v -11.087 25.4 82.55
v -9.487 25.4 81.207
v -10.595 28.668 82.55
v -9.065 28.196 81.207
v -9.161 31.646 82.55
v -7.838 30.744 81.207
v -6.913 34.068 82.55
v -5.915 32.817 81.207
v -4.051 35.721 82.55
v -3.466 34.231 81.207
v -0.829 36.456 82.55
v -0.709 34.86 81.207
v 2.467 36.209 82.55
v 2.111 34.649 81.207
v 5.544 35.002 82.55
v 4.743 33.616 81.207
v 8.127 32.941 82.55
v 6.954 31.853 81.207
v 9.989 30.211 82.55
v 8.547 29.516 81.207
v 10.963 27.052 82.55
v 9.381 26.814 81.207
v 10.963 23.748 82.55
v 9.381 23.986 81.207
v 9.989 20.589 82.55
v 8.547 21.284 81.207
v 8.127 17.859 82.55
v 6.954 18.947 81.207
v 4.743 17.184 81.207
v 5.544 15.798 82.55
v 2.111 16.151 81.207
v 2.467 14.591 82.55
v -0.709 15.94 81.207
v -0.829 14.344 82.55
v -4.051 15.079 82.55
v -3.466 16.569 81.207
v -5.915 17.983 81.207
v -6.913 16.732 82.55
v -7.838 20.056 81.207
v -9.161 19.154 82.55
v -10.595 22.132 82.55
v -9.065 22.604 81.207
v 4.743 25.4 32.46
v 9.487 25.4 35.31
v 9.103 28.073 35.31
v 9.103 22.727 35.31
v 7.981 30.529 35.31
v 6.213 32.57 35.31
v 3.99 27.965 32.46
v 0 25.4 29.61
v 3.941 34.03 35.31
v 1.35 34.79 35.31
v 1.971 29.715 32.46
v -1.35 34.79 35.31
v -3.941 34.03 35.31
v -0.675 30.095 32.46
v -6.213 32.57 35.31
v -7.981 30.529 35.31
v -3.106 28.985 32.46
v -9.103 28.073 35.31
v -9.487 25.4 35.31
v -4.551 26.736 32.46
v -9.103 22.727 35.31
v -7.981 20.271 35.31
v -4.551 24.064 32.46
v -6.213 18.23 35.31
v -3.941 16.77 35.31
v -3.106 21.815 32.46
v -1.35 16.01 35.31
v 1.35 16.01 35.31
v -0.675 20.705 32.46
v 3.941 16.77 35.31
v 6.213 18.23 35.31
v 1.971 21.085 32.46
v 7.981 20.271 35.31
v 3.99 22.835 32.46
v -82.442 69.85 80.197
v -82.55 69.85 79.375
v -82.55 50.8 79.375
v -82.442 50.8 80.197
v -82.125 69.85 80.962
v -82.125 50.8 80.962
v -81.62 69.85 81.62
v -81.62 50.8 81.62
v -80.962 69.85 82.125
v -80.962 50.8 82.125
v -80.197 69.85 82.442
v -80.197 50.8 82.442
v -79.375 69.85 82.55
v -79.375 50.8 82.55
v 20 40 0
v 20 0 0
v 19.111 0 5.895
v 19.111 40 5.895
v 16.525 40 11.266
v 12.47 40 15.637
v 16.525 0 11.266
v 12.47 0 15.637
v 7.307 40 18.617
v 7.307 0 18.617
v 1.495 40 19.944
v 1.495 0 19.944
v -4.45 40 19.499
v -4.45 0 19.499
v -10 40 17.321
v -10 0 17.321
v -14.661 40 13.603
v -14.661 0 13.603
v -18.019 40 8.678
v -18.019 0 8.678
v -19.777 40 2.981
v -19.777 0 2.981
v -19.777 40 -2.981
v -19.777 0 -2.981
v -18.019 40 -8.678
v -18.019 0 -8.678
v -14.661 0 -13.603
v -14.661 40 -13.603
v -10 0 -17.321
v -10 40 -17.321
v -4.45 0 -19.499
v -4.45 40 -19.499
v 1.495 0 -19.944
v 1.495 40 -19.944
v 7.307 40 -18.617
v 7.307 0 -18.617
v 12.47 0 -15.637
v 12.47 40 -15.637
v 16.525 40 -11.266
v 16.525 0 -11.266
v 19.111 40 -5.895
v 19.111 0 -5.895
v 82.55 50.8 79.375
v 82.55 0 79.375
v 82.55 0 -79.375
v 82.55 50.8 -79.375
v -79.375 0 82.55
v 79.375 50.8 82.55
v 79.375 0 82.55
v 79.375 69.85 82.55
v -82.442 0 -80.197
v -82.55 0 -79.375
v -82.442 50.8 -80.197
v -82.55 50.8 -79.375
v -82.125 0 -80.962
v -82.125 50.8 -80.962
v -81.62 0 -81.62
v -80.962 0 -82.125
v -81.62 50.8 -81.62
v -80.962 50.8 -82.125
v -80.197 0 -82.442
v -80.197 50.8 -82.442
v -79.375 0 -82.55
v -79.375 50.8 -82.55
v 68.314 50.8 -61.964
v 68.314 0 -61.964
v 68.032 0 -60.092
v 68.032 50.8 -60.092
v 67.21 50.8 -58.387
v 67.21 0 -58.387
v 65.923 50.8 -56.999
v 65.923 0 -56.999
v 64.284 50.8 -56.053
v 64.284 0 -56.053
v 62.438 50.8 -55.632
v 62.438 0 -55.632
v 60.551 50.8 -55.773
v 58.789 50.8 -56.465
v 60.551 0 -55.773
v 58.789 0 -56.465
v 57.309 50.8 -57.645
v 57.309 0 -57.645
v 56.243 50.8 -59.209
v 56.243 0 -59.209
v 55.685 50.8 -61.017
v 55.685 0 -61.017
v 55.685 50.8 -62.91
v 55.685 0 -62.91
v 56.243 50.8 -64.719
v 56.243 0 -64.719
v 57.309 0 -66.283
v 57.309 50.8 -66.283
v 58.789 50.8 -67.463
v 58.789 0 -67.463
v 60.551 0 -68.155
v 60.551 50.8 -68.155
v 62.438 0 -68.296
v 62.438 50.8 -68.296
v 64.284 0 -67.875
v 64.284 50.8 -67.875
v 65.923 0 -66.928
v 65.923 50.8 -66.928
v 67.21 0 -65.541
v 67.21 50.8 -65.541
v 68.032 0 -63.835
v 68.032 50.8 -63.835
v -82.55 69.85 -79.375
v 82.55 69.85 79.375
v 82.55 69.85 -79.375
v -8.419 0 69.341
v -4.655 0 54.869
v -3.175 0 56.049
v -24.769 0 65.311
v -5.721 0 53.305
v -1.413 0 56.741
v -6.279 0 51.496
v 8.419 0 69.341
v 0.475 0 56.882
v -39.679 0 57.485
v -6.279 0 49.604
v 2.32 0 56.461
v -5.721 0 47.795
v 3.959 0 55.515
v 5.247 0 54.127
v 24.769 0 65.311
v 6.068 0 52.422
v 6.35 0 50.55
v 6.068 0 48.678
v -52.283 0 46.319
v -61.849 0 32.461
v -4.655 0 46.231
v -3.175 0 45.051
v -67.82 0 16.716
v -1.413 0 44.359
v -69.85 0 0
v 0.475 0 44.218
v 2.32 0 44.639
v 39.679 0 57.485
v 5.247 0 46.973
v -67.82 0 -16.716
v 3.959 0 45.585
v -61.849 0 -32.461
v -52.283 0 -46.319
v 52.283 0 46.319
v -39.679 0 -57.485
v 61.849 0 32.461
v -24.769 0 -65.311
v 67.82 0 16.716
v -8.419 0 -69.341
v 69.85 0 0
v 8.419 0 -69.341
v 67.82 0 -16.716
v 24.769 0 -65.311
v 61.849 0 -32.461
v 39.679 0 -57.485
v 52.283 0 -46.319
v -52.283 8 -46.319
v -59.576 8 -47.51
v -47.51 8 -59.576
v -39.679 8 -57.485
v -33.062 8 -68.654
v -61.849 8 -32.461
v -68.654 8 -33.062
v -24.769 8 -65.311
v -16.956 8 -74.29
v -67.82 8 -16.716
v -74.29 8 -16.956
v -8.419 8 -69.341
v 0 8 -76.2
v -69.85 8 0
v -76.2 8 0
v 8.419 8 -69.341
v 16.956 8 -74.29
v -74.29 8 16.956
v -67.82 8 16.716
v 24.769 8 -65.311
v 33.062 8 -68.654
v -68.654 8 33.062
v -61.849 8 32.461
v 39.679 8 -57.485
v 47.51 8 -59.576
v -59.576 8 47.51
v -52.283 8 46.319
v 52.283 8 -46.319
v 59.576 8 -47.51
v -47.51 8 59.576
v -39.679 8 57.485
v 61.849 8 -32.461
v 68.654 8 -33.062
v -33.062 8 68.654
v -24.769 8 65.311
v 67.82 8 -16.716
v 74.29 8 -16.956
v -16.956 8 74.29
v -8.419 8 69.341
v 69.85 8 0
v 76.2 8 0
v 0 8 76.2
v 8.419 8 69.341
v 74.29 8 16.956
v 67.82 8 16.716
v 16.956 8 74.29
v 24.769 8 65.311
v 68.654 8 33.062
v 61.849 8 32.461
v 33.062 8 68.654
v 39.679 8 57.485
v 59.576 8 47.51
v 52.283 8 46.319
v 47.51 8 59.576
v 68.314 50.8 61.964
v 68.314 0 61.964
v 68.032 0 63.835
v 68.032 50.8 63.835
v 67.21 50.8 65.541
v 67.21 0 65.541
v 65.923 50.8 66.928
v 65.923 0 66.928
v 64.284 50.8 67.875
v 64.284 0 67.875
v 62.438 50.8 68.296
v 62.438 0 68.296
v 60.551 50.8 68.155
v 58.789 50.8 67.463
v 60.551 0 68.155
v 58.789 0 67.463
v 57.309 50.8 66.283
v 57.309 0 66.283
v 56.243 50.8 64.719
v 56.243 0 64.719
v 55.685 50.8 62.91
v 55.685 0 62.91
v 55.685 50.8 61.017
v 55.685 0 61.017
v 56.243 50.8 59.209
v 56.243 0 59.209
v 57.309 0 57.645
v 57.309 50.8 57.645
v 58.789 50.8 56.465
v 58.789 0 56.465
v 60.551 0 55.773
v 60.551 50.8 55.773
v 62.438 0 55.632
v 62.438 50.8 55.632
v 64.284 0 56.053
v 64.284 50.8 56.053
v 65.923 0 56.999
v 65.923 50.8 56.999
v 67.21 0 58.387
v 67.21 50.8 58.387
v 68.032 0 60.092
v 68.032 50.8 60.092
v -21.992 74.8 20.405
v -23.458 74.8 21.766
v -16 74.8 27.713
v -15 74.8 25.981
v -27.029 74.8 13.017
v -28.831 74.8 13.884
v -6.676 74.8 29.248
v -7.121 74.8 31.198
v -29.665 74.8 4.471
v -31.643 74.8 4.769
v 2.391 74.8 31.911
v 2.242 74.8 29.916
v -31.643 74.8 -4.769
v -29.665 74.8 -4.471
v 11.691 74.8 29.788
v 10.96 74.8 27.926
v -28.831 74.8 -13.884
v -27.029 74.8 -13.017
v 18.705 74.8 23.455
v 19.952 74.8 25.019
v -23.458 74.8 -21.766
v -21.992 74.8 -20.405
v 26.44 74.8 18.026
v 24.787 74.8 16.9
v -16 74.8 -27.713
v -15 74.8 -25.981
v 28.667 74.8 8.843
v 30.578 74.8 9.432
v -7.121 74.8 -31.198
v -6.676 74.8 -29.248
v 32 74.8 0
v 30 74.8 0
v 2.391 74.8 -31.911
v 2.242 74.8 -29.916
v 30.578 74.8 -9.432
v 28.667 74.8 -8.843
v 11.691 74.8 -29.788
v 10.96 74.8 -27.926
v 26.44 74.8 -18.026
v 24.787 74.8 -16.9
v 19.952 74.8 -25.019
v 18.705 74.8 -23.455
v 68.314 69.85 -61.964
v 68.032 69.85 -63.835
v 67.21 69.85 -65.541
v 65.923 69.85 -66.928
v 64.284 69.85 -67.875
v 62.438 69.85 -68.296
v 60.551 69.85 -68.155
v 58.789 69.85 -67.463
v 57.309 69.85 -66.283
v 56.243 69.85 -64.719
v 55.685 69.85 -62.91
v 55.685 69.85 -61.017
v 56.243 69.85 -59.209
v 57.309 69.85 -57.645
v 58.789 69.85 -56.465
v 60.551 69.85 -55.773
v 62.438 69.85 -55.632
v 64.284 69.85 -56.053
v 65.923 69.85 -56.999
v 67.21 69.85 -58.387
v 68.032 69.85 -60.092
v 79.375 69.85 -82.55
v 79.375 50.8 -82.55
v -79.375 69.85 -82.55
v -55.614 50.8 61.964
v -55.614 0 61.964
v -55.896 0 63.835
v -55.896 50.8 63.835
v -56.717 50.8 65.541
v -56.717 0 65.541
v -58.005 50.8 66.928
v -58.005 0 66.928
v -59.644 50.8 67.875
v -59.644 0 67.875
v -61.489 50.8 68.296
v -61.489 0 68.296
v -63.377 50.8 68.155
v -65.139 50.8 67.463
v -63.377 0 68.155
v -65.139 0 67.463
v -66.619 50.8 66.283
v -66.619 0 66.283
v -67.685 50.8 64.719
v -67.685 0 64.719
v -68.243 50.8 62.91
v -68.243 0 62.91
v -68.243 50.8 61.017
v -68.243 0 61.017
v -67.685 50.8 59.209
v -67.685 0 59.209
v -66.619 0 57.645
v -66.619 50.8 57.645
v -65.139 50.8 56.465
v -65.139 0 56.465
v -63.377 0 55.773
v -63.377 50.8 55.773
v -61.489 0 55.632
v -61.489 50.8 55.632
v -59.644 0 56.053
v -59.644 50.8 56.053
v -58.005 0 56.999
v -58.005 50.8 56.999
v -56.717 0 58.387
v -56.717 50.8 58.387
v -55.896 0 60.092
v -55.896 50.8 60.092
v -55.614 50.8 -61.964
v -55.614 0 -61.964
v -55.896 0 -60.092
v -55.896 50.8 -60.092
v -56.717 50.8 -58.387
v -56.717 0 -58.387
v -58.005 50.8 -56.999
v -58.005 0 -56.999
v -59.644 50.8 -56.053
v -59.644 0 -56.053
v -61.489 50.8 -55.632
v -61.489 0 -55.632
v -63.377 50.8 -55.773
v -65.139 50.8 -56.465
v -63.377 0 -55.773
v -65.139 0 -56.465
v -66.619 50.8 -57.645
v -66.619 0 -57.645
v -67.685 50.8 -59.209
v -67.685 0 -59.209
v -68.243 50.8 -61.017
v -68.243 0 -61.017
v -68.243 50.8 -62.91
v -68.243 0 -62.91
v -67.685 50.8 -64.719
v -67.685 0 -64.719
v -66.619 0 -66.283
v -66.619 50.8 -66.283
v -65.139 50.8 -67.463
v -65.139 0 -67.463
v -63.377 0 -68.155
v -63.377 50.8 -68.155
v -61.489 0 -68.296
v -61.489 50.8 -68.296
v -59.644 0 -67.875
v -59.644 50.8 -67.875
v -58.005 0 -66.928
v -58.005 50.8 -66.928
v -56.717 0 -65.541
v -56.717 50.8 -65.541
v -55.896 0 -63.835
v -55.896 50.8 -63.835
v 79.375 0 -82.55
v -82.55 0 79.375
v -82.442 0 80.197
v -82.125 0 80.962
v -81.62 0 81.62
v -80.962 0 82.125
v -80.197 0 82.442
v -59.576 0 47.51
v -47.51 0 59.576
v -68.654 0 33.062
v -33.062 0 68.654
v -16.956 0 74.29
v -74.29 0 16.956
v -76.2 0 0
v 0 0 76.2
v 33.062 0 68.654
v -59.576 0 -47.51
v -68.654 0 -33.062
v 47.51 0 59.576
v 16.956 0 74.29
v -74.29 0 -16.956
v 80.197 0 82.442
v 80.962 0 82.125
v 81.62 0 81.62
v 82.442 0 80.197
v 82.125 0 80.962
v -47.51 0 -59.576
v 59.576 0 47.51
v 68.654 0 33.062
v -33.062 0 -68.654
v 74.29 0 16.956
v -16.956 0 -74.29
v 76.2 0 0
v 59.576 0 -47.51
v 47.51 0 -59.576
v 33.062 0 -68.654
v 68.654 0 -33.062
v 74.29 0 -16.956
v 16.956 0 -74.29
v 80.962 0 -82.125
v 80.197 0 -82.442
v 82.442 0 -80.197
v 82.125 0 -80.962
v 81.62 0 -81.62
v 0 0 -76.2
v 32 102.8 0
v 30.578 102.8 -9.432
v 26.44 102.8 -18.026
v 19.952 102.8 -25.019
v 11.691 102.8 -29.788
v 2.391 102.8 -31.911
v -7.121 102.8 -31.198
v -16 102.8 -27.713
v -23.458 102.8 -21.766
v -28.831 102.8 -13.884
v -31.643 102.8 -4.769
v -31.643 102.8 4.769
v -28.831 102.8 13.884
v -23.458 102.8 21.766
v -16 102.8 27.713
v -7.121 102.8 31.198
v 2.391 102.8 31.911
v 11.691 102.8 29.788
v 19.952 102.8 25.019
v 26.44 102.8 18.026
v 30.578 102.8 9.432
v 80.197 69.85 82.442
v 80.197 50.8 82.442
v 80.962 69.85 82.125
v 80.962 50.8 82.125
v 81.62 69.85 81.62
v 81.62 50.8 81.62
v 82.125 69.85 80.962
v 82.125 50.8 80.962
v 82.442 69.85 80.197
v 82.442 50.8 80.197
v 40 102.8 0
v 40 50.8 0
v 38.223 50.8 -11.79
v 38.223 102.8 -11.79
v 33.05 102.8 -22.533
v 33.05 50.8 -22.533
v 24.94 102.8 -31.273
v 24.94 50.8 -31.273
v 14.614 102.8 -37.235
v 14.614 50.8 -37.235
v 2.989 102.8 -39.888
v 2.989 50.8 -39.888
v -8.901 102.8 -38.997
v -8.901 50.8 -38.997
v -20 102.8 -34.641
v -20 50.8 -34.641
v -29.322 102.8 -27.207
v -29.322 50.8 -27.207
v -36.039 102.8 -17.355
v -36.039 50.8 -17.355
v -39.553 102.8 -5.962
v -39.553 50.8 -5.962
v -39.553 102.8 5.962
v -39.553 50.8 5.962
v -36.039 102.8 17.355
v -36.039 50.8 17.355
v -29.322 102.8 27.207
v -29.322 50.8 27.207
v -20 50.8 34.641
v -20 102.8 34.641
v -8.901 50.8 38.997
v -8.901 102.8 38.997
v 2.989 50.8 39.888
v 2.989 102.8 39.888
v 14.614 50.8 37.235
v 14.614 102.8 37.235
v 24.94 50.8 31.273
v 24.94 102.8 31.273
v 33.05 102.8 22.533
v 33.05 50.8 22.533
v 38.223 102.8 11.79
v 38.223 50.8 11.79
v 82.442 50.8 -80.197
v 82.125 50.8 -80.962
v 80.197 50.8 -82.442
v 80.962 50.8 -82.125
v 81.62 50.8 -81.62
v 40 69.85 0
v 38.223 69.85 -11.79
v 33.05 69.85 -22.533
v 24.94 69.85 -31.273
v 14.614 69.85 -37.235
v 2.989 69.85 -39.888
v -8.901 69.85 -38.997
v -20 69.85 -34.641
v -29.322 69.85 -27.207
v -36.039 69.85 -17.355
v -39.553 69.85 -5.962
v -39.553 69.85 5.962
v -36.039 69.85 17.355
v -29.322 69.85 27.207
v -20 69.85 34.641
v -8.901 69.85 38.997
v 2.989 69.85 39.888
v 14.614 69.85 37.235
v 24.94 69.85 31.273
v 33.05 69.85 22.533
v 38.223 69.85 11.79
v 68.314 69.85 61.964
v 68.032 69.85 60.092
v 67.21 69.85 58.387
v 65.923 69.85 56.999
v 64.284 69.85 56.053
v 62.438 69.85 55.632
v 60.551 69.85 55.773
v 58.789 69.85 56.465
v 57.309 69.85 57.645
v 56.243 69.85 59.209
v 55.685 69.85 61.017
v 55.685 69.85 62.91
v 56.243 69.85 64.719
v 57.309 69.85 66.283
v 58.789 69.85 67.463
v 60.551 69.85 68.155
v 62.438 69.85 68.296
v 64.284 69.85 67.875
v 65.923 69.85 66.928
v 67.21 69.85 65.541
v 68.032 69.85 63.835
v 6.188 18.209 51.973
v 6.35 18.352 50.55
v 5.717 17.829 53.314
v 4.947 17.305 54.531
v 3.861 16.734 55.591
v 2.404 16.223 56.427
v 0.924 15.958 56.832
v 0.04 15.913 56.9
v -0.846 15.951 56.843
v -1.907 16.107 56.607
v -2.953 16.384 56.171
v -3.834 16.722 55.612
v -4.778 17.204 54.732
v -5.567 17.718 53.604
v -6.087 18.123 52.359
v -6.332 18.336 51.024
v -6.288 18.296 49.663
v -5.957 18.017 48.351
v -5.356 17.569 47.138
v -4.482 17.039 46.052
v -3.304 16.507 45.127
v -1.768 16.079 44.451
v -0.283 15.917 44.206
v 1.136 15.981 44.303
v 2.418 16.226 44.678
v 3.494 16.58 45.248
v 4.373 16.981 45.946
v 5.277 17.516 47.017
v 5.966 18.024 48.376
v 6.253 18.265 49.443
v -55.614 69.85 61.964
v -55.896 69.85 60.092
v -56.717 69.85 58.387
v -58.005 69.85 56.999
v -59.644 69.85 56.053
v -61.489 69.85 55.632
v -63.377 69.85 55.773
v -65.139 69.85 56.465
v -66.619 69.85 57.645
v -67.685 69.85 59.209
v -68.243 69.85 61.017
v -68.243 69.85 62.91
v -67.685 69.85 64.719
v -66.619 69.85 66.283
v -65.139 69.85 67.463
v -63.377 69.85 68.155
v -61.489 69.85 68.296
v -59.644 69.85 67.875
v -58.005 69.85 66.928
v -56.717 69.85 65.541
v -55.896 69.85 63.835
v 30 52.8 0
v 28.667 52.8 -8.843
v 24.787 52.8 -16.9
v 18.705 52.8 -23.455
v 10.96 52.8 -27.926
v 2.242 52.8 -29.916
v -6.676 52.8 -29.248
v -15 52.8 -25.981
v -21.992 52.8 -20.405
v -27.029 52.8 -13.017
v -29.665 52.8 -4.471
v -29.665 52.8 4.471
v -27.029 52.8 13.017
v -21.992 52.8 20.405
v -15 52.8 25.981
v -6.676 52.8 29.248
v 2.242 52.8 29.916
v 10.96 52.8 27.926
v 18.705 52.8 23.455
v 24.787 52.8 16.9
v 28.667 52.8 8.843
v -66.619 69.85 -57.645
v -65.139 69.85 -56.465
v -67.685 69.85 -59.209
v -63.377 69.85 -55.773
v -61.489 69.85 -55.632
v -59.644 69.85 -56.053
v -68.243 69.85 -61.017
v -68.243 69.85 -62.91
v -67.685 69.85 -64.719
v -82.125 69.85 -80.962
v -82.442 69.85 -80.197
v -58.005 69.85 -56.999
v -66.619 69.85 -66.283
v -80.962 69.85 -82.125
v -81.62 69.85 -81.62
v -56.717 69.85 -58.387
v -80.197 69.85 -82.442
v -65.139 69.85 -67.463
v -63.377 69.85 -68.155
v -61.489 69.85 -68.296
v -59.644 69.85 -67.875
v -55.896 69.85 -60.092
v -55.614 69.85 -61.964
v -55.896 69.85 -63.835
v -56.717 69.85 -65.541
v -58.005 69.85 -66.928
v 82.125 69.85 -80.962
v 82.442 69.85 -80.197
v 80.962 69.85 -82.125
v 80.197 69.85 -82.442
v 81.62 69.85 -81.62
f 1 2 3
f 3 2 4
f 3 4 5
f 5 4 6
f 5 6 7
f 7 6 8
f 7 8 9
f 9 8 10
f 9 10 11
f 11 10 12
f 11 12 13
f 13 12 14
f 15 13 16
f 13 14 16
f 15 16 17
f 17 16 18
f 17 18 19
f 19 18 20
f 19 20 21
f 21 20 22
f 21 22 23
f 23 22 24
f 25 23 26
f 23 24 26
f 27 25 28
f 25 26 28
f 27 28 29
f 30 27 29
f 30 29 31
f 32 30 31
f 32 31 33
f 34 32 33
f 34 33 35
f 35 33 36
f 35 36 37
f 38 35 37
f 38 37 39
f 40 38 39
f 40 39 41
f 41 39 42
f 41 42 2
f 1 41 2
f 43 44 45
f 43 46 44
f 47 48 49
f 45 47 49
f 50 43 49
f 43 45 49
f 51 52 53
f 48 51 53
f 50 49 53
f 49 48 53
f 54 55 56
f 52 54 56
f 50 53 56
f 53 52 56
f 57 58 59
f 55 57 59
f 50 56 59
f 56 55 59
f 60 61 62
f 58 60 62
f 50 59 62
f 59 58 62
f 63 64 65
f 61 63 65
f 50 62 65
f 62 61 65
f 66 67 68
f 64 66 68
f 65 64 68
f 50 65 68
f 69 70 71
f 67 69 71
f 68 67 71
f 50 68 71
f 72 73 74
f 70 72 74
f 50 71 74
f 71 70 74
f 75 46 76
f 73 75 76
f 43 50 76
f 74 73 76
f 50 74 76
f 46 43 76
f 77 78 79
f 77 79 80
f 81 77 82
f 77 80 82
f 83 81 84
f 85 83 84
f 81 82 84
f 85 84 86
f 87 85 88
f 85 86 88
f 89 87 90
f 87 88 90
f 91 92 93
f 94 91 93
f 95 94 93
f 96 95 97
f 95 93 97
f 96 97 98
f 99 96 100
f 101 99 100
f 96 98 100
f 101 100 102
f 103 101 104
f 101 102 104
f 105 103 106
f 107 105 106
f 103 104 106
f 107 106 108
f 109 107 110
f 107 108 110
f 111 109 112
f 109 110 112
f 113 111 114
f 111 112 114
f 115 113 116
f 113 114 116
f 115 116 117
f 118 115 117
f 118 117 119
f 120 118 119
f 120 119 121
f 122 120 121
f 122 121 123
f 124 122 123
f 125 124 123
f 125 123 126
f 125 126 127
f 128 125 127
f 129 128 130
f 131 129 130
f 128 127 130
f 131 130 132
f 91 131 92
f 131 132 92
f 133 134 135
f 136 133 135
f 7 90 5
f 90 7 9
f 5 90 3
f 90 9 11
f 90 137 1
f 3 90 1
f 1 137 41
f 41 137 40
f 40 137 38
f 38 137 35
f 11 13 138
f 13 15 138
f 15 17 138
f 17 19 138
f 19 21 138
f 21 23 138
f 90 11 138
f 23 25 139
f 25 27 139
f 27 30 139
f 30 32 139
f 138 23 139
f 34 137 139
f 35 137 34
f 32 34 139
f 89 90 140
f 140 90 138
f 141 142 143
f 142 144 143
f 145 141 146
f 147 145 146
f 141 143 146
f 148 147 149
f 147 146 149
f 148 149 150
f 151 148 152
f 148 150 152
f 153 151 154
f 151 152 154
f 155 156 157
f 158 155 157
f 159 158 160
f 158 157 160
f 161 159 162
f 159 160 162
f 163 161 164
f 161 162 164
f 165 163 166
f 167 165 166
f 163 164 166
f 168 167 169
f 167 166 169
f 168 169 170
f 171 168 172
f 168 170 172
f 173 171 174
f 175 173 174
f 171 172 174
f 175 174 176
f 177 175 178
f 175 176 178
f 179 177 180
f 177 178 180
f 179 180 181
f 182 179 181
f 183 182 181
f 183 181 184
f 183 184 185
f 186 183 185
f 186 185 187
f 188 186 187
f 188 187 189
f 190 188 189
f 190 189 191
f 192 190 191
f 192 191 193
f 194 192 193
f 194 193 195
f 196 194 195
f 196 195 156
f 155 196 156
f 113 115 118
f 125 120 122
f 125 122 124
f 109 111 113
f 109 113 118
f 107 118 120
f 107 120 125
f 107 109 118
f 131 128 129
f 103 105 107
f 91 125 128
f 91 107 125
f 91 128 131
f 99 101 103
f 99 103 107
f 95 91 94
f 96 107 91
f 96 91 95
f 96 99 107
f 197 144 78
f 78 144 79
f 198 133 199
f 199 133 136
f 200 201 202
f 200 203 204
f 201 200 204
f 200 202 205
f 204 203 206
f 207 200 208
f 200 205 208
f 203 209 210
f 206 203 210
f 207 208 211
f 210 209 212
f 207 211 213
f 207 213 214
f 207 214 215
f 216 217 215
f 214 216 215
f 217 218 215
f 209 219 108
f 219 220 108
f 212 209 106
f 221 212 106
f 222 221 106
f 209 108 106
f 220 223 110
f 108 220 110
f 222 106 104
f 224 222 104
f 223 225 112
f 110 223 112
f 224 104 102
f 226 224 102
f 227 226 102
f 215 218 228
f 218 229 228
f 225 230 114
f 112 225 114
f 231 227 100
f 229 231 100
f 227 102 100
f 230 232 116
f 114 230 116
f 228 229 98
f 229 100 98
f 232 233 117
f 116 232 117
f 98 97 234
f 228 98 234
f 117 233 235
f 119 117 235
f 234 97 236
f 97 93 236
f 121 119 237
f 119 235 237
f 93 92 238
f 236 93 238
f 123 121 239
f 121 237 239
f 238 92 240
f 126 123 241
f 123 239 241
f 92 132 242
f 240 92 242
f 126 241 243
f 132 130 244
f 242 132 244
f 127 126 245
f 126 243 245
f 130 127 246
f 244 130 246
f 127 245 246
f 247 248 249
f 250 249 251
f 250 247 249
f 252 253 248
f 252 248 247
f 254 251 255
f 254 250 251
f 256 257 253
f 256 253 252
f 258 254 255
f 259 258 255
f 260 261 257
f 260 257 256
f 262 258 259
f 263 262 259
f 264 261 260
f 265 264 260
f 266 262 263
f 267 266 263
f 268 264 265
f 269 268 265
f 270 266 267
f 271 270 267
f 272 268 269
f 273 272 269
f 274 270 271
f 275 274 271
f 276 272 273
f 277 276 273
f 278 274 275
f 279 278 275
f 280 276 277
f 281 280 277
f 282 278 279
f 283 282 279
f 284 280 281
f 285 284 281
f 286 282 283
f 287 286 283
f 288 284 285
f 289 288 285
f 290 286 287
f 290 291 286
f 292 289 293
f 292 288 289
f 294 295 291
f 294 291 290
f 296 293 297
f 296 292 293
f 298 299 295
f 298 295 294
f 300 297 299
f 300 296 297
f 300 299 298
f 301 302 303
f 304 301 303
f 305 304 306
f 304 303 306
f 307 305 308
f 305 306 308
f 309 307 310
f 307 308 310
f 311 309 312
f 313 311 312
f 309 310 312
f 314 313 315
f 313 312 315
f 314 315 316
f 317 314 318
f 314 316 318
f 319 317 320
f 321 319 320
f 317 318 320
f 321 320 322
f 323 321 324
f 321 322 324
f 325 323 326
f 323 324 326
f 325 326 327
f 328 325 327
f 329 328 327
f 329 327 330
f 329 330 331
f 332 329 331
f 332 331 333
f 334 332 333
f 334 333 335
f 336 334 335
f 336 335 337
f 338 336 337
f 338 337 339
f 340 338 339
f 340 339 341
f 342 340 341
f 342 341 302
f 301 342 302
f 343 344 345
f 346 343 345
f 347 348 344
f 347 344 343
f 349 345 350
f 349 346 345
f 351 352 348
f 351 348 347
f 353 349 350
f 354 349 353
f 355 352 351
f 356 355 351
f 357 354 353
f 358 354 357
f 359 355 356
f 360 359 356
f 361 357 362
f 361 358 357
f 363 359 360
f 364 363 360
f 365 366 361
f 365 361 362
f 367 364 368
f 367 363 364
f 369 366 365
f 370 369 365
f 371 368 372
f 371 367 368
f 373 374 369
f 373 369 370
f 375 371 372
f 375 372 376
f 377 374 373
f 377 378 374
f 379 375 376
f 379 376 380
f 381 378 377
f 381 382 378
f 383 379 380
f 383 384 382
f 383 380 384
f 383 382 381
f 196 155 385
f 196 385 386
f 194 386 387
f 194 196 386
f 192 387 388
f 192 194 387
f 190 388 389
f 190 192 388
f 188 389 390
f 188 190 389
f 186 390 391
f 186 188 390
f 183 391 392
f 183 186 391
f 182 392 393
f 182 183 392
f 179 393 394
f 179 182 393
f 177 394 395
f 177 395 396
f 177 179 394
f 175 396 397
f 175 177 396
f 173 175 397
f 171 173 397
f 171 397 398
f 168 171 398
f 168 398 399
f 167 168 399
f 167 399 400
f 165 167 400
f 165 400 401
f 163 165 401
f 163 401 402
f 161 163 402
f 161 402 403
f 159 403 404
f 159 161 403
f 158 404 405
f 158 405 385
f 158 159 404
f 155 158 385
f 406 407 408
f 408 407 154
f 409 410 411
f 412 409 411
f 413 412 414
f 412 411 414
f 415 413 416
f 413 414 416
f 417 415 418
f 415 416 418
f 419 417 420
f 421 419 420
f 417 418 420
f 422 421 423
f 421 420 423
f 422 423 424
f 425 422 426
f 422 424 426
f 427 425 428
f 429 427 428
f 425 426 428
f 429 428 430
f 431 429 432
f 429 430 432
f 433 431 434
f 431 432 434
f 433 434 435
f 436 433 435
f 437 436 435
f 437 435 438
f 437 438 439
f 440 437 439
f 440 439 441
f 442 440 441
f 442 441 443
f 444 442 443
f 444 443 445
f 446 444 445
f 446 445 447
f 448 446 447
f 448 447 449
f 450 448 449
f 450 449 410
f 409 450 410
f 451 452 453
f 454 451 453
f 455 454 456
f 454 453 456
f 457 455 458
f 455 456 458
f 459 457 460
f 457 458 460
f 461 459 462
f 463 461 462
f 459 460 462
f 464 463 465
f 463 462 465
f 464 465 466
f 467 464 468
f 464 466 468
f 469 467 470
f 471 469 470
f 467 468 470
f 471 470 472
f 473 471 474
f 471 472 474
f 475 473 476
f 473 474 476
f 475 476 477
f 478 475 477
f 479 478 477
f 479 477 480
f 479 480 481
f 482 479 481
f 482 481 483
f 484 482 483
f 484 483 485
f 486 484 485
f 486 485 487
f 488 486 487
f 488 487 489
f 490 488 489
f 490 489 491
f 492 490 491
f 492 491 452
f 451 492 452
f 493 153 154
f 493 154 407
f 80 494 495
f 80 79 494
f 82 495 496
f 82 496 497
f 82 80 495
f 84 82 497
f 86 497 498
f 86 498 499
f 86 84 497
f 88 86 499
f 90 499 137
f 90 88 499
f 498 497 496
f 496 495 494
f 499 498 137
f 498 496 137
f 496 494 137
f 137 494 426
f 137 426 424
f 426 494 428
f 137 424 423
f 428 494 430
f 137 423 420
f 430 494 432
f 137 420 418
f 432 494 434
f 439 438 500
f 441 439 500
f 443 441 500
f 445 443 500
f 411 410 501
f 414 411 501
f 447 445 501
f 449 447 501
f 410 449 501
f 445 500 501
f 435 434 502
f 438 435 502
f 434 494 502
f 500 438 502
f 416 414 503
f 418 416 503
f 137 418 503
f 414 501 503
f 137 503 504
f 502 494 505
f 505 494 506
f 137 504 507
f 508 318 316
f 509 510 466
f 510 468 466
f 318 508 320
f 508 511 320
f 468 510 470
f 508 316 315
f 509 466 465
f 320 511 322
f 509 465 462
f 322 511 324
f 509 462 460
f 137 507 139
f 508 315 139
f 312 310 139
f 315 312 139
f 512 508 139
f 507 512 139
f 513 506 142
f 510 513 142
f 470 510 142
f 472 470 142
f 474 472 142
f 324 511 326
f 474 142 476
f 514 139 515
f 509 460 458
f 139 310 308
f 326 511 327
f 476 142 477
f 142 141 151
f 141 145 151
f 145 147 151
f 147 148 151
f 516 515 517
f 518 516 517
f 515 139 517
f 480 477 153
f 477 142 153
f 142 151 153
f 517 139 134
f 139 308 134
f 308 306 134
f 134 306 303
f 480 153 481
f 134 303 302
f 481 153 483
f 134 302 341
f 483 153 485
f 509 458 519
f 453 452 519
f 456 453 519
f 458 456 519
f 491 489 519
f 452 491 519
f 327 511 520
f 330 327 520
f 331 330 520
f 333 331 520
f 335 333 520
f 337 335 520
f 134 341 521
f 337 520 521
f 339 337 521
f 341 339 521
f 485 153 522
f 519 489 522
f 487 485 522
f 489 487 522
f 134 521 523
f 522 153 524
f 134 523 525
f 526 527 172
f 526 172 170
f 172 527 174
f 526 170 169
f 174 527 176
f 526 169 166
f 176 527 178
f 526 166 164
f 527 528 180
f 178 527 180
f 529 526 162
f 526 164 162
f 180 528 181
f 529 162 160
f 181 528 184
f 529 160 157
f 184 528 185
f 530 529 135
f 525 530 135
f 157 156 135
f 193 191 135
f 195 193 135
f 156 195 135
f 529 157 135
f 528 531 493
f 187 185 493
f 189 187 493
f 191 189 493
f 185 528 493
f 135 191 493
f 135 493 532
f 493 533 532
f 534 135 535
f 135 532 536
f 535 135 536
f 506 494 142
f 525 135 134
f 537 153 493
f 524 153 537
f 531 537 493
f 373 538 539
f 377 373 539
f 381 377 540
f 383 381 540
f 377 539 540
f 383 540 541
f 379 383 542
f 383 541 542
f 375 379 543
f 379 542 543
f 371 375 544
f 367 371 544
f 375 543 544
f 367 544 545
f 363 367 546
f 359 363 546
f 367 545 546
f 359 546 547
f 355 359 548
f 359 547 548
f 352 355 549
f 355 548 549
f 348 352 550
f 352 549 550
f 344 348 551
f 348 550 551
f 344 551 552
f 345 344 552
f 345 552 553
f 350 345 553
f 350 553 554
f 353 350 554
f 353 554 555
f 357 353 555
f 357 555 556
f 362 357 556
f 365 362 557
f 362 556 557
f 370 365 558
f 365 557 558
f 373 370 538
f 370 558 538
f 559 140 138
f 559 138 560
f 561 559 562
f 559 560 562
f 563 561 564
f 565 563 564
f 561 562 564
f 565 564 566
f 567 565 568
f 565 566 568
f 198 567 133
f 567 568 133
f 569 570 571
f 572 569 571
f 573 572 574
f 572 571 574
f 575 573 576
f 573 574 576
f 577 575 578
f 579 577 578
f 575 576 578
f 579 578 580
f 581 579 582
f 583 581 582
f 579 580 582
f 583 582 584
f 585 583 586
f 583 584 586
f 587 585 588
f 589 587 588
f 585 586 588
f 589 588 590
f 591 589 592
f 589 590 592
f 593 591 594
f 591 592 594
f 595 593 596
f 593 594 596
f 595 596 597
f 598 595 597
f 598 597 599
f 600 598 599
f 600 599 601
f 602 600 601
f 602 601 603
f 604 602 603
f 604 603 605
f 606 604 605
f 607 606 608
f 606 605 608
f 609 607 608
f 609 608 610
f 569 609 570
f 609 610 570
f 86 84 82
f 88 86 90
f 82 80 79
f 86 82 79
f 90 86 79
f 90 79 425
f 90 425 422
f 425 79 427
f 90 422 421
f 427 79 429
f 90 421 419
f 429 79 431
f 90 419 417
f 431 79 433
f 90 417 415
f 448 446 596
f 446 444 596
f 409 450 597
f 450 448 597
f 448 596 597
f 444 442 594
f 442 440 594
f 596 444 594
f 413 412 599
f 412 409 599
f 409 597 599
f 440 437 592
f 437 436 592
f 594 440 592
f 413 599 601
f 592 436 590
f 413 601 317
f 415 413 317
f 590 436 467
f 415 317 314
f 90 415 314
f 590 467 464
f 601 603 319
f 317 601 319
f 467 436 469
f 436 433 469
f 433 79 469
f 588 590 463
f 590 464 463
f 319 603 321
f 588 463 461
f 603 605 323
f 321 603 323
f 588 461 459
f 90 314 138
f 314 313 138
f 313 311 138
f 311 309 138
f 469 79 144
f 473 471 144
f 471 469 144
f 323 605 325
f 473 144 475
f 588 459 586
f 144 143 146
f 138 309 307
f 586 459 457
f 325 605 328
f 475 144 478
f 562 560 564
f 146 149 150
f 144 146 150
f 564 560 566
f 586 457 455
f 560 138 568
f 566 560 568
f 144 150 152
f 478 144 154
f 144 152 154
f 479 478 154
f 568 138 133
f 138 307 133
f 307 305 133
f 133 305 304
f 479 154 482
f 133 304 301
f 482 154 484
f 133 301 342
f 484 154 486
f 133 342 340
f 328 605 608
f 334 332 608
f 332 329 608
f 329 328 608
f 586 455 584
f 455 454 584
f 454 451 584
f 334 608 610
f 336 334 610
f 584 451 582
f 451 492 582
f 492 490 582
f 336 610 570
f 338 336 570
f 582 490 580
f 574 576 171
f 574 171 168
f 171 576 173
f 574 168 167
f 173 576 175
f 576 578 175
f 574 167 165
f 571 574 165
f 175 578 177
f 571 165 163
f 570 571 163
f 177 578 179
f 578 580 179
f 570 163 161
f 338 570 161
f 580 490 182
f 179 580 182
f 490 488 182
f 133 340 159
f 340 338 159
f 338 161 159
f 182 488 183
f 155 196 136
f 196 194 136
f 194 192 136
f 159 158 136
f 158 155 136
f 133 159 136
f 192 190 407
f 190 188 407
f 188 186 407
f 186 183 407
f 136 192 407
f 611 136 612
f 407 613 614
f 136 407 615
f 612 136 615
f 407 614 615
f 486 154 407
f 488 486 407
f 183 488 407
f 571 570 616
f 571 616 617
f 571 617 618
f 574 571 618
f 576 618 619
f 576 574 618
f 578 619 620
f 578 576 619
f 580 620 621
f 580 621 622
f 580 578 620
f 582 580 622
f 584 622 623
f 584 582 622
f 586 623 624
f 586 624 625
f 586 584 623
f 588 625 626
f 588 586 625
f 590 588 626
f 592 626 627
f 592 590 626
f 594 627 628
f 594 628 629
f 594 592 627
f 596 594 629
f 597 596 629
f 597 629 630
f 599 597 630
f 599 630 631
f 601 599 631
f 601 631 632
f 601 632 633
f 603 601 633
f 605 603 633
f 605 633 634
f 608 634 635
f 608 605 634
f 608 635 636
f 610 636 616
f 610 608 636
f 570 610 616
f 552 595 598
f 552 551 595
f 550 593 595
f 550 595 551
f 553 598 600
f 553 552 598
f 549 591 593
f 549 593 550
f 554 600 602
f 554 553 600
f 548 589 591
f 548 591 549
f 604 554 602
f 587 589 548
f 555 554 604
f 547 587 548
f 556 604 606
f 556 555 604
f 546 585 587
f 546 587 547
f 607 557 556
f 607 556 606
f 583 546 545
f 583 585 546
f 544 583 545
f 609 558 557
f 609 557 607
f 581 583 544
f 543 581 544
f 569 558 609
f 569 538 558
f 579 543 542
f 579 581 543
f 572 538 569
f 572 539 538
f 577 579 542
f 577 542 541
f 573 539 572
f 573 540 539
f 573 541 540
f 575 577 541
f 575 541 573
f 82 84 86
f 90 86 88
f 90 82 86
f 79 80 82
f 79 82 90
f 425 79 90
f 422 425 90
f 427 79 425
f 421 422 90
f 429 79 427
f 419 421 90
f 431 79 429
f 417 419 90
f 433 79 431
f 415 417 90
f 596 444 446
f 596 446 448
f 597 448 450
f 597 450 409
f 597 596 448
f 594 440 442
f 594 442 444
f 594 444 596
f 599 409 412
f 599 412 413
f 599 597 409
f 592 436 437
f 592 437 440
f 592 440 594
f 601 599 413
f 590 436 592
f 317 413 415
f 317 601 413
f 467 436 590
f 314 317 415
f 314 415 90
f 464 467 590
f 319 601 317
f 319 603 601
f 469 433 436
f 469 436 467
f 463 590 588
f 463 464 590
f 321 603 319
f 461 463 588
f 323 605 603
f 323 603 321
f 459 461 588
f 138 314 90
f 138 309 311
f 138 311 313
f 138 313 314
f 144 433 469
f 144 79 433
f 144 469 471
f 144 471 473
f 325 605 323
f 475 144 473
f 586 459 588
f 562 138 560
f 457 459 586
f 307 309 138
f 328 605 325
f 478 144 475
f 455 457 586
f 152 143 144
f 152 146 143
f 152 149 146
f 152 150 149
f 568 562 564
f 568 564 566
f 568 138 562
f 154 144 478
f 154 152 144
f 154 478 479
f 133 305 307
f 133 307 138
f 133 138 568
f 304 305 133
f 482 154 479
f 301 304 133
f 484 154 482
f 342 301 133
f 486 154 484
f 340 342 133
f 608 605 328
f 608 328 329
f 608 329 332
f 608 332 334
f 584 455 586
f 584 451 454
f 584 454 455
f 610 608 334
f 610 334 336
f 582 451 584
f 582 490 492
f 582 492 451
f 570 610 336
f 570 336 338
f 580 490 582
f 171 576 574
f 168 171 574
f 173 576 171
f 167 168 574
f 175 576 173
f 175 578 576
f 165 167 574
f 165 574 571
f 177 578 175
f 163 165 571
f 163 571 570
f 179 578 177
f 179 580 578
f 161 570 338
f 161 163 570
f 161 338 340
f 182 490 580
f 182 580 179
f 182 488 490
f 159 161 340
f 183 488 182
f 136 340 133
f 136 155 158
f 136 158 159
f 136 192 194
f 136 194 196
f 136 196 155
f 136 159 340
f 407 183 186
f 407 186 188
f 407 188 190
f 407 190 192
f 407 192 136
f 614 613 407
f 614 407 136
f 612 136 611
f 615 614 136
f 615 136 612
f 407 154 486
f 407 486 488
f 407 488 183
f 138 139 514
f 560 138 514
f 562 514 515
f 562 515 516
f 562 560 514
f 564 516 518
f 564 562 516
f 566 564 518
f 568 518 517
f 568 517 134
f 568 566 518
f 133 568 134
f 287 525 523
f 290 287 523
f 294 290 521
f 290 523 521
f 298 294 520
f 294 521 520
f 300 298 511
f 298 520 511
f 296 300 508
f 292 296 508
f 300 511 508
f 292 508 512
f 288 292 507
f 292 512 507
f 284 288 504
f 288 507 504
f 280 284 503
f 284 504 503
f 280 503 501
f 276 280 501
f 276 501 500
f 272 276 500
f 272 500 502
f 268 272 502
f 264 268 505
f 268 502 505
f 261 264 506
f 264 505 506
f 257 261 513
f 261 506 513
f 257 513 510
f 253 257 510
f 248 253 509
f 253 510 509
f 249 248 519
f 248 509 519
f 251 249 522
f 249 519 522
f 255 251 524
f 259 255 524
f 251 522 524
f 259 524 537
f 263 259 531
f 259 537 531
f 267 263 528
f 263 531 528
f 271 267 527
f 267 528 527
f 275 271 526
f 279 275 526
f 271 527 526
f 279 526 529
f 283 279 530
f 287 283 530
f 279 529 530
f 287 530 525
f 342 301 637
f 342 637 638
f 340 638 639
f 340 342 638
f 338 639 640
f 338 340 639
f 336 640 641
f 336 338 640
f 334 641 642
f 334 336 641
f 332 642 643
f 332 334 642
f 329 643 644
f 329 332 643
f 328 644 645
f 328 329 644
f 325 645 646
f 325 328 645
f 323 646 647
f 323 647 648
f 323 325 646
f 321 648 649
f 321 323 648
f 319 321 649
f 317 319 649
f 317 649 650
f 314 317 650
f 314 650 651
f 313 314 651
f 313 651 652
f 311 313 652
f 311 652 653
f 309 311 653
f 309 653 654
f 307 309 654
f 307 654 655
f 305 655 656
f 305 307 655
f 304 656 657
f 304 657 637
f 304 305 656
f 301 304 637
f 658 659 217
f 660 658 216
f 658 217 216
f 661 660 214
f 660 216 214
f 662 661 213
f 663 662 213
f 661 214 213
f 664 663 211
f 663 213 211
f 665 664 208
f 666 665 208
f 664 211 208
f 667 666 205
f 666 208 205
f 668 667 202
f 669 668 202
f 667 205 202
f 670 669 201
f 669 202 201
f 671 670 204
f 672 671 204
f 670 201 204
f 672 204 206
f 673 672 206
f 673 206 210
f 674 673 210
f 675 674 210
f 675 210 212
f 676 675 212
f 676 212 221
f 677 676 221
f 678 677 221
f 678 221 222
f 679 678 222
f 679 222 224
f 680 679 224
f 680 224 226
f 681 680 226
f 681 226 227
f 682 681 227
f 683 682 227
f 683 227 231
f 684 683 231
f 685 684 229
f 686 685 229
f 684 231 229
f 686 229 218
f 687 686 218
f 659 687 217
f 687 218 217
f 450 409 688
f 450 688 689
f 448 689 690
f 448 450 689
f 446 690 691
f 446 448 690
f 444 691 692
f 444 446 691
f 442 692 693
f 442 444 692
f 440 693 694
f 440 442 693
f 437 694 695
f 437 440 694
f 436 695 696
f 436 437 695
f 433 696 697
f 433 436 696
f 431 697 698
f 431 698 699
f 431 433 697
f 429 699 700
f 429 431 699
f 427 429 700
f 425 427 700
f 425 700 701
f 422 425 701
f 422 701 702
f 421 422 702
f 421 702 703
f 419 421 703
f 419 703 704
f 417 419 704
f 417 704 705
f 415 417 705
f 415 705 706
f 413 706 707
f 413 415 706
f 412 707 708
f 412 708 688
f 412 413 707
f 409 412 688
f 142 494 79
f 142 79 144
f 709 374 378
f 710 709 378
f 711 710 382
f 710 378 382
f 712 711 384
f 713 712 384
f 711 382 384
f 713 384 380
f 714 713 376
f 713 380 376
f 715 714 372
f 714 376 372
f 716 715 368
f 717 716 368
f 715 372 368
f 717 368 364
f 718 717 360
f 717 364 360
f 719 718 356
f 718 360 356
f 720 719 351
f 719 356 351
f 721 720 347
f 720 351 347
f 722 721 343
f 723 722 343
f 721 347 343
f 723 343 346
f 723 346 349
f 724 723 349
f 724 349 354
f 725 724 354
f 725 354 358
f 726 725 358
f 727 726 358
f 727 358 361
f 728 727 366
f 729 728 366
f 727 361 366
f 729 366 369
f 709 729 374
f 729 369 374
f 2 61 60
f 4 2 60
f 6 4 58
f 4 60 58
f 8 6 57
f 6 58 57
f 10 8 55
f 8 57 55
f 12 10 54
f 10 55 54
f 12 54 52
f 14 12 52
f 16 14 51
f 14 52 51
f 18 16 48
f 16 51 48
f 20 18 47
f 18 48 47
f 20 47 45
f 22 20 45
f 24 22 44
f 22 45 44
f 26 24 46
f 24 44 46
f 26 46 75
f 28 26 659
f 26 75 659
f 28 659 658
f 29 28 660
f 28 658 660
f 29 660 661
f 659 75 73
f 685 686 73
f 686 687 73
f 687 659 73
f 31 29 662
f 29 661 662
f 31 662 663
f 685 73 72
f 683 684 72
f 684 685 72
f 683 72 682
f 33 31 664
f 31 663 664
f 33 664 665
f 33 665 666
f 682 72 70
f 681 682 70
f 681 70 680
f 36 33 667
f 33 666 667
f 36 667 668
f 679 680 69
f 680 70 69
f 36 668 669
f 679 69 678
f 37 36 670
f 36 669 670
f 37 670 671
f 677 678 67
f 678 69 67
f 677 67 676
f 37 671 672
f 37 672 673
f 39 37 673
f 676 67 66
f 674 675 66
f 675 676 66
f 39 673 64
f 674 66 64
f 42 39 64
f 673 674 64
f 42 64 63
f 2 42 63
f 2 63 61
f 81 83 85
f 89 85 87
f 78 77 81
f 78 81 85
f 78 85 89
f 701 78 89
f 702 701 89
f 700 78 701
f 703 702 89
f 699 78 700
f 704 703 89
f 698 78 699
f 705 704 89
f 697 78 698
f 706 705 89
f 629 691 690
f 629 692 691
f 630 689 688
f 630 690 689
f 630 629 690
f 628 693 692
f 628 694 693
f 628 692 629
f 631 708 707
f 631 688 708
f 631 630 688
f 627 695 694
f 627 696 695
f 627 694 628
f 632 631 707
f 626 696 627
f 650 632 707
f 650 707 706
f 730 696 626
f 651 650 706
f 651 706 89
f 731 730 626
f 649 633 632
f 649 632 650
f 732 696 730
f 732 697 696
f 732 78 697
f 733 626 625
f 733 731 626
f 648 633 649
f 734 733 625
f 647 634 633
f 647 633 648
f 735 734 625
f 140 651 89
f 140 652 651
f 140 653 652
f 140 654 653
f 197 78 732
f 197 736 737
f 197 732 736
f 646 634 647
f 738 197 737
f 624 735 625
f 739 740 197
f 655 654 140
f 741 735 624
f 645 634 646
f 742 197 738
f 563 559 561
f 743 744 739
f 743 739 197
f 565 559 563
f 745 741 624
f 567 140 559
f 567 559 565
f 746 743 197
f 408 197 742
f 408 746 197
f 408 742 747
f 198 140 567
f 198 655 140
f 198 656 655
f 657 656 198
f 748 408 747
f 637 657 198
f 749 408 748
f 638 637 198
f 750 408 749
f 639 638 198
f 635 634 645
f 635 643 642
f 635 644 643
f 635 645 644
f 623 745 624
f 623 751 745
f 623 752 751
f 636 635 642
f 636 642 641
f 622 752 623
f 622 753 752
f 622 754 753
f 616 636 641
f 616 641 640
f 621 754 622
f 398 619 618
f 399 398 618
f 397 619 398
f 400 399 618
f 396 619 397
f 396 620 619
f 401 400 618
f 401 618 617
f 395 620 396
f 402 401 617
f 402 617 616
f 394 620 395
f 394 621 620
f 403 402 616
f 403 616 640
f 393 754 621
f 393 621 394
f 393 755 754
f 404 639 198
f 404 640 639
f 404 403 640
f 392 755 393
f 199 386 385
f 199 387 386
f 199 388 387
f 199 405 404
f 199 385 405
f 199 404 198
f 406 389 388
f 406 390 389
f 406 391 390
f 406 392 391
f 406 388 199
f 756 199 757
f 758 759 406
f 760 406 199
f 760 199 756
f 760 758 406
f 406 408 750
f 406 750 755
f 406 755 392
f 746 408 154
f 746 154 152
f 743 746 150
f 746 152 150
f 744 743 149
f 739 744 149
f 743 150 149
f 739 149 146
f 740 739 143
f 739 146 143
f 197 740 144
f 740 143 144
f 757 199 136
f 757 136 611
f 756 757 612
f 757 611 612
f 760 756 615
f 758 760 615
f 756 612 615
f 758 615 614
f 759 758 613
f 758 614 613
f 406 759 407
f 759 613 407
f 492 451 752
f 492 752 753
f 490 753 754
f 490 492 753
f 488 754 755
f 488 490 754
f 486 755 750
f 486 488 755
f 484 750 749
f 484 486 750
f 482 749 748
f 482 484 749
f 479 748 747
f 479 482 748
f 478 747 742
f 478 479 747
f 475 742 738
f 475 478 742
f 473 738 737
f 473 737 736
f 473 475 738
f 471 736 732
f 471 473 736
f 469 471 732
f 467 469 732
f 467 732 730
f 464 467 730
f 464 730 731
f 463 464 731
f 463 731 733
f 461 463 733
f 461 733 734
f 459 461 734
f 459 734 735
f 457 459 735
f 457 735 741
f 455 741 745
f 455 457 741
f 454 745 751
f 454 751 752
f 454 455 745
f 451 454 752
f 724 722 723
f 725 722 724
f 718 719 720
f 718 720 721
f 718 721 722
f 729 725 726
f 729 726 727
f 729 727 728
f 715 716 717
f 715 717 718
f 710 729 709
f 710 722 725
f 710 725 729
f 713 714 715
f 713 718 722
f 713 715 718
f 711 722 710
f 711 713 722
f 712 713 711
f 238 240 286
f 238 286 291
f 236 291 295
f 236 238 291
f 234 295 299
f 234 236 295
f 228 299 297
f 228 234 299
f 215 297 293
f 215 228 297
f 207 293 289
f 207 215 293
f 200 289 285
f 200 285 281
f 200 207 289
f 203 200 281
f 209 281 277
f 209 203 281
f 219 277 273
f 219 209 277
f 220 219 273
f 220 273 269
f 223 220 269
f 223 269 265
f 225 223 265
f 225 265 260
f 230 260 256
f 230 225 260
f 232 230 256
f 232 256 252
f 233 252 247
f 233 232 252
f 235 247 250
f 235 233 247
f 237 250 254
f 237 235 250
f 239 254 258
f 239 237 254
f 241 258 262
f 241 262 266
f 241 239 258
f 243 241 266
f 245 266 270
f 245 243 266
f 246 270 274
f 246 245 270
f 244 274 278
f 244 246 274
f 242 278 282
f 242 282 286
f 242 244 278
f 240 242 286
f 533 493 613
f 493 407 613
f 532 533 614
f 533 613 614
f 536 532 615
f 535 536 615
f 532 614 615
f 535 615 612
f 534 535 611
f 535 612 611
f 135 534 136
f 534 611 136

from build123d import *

# Parameters (mm, degrees)
SKETCH1_W                              = 165.1
SKETCH1_H                              = 165.1
BOSS_EXTRUDE1_DEPTH                    = 50.8
SKETCH2_R                              = 40
BOSS_EXTRUDE2_DEPTH                    = 52
SKETCH3_R                              = 32
CUT_EXTRUDE1_DEPTH                     = 28
SKETCH4_R                              = 30
CUT_EXTRUDE2_DEPTH                     = 22
FILLET1_R                              = 3.175
SKETCH5_R                              = 20
CUT_EXTRUDE3_DEPTH                     = 40
SKETCH6_R                              = 76.2
SKETCH6_R_2                            = 69.85
CUT_EXTRUDE4_DEPTH                     = 8
F_1_2_14_NPSM_TAPPED_HOLE1_D           = 18.9738
F_1_2_14_NPSM_TAPPED_HOLE1_DEPTH       = 47.24
F_1_2_14_NPSM_TAPPED_HOLE1_CSINK_D     = 22.1742
F_1_2_14_NPSM_TAPPED_HOLE1_CSINK_ANGLE = 100
F_1_2_14_NPSM_TAPPED_HOLE1_TIP         = 5.700304607
SKETCH10_R                             = 6.35
CUT_EXTRUDE5_DEPTH                     = 25
SKETCH11_R                             = 6.35
CUT_EXTRUDE6_DEPTH                     = 103.8
SKETCH13_R                             = 6.35
SKETCH13_R_2                           = 40
BOSS_EXTRUDE3_DEPTH                    = 19.05


with BuildPart() as part:
    # Sketch1 → Boss-Extrude1 (new body)
    with BuildSketch(Plane(origin=(0, 0, 0), x_dir=(1, 0, 0), z_dir=(0, 1, 0))):
        Rectangle(SKETCH1_W, SKETCH1_H)
    extrude(amount=BOSS_EXTRUDE1_DEPTH)

    # Sketch2 → Boss-Extrude2 (add)
    with BuildSketch(Plane(origin=(0, 50.8, 0), x_dir=(1, 0, 0), z_dir=(0, 1, 0))):
        Circle(SKETCH2_R)
    extrude(amount=BOSS_EXTRUDE2_DEPTH)

    # Sketch3 → Cut-Extrude1 (cut)
    with BuildSketch(Plane(origin=(0, 102.8, 0), x_dir=(1, 0, 0), z_dir=(0, 1, 0))):
        Circle(SKETCH3_R)
    extrude(amount=-CUT_EXTRUDE1_DEPTH, mode=Mode.SUBTRACT)

    # Sketch4 → Cut-Extrude2 (cut)
    with BuildSketch(Plane(origin=(0, 74.8, 0), x_dir=(1, 0, 0), z_dir=(0, 1, 0))):
        Circle(SKETCH4_R)
    extrude(amount=-CUT_EXTRUDE2_DEPTH, mode=Mode.SUBTRACT)

    # Fillet1
    fillet1_edges = [part.edges().sort_by_distance(p)[0] for p in [
        (82.55, 25.4, 82.55),
        (-82.55, 25.4, 82.55),
        (-82.55, 25.4, -82.55),
        (82.55, 25.4, -82.55),
    ]]
    fillet(fillet1_edges, radius=FILLET1_R)

    # Sketch5 → Cut-Extrude3 (cut)
    with BuildSketch(Plane.XZ):
        Circle(SKETCH5_R)
    extrude(amount=-CUT_EXTRUDE3_DEPTH, mode=Mode.SUBTRACT)

    # Sketch6 → Cut-Extrude4 (cut)
    with BuildSketch(Plane.XZ):
        Circle(SKETCH6_R)
        Circle(SKETCH6_R_2, mode=Mode.SUBTRACT)
    extrude(amount=-CUT_EXTRUDE4_DEPTH, mode=Mode.SUBTRACT)

    # 1/2-14 NPSM Tapped Hole1
    with Locations(Plane.XY.offset(82.55)):
        with Locations((0, 25.4)):
            CounterSinkHole(F_1_2_14_NPSM_TAPPED_HOLE1_D / 2, F_1_2_14_NPSM_TAPPED_HOLE1_CSINK_D / 2, depth=F_1_2_14_NPSM_TAPPED_HOLE1_DEPTH, counter_sink_angle=F_1_2_14_NPSM_TAPPED_HOLE1_CSINK_ANGLE)
            with Locations((0, 0, -(F_1_2_14_NPSM_TAPPED_HOLE1_DEPTH + F_1_2_14_NPSM_TAPPED_HOLE1_TIP / 2))):  # 118° drill point
                Cone(0, F_1_2_14_NPSM_TAPPED_HOLE1_D / 2, F_1_2_14_NPSM_TAPPED_HOLE1_TIP, mode=Mode.SUBTRACT)

    # Sketch10 → Cut-Extrude5 (cut)
    with BuildSketch(Plane.XZ):
        with Locations((0, 50.55)):
            Circle(SKETCH10_R)
    extrude(amount=-CUT_EXTRUDE5_DEPTH, mode=Mode.SUBTRACT)

    # Sketch11 → Cut-Extrude6 (cut, through all)
    with BuildSketch(Plane.XZ):
        with Locations((-61.963767235, 61.963767235)):
            Circle(SKETCH11_R)
        with Locations((61.963767235, 61.963767235)):
            Circle(SKETCH11_R)
        with Locations((61.963767235, -61.963767235)):
            Circle(SKETCH11_R)
        with Locations((-61.963767235, -61.963767235)):
            Circle(SKETCH11_R)
    extrude(amount=-CUT_EXTRUDE6_DEPTH, mode=Mode.SUBTRACT)


with BuildPart() as body_2:
    # Sketch13 → Boss-Extrude3 (new body)
    with BuildSketch(Plane(origin=(0, 50.8, 0), x_dir=(1, 0, 0), z_dir=(0, 1, 0))):
        with BuildLine():
            Line((-82.55, 79.375), (-82.55, -79.375))
            ThreePointArc((-82.55, -79.375), (-81.62006403, -81.62006403), (-79.375, -82.55))
            Line((-79.375, -82.55), (79.375, -82.55))
            ThreePointArc((79.375, -82.55), (81.62006403, -81.62006403), (82.55, -79.375))
            Line((82.55, -79.375), (82.55, 79.375))
            ThreePointArc((82.55, 79.375), (81.62006403, 81.62006403), (79.375, 82.55))
            Line((79.375, 82.55), (-79.375, 82.55))
            ThreePointArc((-79.375, 82.55), (-81.62006403, 81.62006403), (-82.55, 79.375))
        make_face()
        with Locations((61.963767235, 61.963767235)):
            Circle(SKETCH13_R, mode=Mode.SUBTRACT)
        with Locations((61.963767235, -61.963767235)):
            Circle(SKETCH13_R, mode=Mode.SUBTRACT)
        Circle(SKETCH13_R_2, mode=Mode.SUBTRACT)
        with Locations((-61.963767235, -61.963767235)):
            Circle(SKETCH13_R, mode=Mode.SUBTRACT)
        with Locations((-61.963767235, 61.963767235)):
            Circle(SKETCH13_R, mode=Mode.SUBTRACT)
    extrude(amount=BOSS_EXTRUDE3_DEPTH)


solid = Compound([part.part, body_2.part])
